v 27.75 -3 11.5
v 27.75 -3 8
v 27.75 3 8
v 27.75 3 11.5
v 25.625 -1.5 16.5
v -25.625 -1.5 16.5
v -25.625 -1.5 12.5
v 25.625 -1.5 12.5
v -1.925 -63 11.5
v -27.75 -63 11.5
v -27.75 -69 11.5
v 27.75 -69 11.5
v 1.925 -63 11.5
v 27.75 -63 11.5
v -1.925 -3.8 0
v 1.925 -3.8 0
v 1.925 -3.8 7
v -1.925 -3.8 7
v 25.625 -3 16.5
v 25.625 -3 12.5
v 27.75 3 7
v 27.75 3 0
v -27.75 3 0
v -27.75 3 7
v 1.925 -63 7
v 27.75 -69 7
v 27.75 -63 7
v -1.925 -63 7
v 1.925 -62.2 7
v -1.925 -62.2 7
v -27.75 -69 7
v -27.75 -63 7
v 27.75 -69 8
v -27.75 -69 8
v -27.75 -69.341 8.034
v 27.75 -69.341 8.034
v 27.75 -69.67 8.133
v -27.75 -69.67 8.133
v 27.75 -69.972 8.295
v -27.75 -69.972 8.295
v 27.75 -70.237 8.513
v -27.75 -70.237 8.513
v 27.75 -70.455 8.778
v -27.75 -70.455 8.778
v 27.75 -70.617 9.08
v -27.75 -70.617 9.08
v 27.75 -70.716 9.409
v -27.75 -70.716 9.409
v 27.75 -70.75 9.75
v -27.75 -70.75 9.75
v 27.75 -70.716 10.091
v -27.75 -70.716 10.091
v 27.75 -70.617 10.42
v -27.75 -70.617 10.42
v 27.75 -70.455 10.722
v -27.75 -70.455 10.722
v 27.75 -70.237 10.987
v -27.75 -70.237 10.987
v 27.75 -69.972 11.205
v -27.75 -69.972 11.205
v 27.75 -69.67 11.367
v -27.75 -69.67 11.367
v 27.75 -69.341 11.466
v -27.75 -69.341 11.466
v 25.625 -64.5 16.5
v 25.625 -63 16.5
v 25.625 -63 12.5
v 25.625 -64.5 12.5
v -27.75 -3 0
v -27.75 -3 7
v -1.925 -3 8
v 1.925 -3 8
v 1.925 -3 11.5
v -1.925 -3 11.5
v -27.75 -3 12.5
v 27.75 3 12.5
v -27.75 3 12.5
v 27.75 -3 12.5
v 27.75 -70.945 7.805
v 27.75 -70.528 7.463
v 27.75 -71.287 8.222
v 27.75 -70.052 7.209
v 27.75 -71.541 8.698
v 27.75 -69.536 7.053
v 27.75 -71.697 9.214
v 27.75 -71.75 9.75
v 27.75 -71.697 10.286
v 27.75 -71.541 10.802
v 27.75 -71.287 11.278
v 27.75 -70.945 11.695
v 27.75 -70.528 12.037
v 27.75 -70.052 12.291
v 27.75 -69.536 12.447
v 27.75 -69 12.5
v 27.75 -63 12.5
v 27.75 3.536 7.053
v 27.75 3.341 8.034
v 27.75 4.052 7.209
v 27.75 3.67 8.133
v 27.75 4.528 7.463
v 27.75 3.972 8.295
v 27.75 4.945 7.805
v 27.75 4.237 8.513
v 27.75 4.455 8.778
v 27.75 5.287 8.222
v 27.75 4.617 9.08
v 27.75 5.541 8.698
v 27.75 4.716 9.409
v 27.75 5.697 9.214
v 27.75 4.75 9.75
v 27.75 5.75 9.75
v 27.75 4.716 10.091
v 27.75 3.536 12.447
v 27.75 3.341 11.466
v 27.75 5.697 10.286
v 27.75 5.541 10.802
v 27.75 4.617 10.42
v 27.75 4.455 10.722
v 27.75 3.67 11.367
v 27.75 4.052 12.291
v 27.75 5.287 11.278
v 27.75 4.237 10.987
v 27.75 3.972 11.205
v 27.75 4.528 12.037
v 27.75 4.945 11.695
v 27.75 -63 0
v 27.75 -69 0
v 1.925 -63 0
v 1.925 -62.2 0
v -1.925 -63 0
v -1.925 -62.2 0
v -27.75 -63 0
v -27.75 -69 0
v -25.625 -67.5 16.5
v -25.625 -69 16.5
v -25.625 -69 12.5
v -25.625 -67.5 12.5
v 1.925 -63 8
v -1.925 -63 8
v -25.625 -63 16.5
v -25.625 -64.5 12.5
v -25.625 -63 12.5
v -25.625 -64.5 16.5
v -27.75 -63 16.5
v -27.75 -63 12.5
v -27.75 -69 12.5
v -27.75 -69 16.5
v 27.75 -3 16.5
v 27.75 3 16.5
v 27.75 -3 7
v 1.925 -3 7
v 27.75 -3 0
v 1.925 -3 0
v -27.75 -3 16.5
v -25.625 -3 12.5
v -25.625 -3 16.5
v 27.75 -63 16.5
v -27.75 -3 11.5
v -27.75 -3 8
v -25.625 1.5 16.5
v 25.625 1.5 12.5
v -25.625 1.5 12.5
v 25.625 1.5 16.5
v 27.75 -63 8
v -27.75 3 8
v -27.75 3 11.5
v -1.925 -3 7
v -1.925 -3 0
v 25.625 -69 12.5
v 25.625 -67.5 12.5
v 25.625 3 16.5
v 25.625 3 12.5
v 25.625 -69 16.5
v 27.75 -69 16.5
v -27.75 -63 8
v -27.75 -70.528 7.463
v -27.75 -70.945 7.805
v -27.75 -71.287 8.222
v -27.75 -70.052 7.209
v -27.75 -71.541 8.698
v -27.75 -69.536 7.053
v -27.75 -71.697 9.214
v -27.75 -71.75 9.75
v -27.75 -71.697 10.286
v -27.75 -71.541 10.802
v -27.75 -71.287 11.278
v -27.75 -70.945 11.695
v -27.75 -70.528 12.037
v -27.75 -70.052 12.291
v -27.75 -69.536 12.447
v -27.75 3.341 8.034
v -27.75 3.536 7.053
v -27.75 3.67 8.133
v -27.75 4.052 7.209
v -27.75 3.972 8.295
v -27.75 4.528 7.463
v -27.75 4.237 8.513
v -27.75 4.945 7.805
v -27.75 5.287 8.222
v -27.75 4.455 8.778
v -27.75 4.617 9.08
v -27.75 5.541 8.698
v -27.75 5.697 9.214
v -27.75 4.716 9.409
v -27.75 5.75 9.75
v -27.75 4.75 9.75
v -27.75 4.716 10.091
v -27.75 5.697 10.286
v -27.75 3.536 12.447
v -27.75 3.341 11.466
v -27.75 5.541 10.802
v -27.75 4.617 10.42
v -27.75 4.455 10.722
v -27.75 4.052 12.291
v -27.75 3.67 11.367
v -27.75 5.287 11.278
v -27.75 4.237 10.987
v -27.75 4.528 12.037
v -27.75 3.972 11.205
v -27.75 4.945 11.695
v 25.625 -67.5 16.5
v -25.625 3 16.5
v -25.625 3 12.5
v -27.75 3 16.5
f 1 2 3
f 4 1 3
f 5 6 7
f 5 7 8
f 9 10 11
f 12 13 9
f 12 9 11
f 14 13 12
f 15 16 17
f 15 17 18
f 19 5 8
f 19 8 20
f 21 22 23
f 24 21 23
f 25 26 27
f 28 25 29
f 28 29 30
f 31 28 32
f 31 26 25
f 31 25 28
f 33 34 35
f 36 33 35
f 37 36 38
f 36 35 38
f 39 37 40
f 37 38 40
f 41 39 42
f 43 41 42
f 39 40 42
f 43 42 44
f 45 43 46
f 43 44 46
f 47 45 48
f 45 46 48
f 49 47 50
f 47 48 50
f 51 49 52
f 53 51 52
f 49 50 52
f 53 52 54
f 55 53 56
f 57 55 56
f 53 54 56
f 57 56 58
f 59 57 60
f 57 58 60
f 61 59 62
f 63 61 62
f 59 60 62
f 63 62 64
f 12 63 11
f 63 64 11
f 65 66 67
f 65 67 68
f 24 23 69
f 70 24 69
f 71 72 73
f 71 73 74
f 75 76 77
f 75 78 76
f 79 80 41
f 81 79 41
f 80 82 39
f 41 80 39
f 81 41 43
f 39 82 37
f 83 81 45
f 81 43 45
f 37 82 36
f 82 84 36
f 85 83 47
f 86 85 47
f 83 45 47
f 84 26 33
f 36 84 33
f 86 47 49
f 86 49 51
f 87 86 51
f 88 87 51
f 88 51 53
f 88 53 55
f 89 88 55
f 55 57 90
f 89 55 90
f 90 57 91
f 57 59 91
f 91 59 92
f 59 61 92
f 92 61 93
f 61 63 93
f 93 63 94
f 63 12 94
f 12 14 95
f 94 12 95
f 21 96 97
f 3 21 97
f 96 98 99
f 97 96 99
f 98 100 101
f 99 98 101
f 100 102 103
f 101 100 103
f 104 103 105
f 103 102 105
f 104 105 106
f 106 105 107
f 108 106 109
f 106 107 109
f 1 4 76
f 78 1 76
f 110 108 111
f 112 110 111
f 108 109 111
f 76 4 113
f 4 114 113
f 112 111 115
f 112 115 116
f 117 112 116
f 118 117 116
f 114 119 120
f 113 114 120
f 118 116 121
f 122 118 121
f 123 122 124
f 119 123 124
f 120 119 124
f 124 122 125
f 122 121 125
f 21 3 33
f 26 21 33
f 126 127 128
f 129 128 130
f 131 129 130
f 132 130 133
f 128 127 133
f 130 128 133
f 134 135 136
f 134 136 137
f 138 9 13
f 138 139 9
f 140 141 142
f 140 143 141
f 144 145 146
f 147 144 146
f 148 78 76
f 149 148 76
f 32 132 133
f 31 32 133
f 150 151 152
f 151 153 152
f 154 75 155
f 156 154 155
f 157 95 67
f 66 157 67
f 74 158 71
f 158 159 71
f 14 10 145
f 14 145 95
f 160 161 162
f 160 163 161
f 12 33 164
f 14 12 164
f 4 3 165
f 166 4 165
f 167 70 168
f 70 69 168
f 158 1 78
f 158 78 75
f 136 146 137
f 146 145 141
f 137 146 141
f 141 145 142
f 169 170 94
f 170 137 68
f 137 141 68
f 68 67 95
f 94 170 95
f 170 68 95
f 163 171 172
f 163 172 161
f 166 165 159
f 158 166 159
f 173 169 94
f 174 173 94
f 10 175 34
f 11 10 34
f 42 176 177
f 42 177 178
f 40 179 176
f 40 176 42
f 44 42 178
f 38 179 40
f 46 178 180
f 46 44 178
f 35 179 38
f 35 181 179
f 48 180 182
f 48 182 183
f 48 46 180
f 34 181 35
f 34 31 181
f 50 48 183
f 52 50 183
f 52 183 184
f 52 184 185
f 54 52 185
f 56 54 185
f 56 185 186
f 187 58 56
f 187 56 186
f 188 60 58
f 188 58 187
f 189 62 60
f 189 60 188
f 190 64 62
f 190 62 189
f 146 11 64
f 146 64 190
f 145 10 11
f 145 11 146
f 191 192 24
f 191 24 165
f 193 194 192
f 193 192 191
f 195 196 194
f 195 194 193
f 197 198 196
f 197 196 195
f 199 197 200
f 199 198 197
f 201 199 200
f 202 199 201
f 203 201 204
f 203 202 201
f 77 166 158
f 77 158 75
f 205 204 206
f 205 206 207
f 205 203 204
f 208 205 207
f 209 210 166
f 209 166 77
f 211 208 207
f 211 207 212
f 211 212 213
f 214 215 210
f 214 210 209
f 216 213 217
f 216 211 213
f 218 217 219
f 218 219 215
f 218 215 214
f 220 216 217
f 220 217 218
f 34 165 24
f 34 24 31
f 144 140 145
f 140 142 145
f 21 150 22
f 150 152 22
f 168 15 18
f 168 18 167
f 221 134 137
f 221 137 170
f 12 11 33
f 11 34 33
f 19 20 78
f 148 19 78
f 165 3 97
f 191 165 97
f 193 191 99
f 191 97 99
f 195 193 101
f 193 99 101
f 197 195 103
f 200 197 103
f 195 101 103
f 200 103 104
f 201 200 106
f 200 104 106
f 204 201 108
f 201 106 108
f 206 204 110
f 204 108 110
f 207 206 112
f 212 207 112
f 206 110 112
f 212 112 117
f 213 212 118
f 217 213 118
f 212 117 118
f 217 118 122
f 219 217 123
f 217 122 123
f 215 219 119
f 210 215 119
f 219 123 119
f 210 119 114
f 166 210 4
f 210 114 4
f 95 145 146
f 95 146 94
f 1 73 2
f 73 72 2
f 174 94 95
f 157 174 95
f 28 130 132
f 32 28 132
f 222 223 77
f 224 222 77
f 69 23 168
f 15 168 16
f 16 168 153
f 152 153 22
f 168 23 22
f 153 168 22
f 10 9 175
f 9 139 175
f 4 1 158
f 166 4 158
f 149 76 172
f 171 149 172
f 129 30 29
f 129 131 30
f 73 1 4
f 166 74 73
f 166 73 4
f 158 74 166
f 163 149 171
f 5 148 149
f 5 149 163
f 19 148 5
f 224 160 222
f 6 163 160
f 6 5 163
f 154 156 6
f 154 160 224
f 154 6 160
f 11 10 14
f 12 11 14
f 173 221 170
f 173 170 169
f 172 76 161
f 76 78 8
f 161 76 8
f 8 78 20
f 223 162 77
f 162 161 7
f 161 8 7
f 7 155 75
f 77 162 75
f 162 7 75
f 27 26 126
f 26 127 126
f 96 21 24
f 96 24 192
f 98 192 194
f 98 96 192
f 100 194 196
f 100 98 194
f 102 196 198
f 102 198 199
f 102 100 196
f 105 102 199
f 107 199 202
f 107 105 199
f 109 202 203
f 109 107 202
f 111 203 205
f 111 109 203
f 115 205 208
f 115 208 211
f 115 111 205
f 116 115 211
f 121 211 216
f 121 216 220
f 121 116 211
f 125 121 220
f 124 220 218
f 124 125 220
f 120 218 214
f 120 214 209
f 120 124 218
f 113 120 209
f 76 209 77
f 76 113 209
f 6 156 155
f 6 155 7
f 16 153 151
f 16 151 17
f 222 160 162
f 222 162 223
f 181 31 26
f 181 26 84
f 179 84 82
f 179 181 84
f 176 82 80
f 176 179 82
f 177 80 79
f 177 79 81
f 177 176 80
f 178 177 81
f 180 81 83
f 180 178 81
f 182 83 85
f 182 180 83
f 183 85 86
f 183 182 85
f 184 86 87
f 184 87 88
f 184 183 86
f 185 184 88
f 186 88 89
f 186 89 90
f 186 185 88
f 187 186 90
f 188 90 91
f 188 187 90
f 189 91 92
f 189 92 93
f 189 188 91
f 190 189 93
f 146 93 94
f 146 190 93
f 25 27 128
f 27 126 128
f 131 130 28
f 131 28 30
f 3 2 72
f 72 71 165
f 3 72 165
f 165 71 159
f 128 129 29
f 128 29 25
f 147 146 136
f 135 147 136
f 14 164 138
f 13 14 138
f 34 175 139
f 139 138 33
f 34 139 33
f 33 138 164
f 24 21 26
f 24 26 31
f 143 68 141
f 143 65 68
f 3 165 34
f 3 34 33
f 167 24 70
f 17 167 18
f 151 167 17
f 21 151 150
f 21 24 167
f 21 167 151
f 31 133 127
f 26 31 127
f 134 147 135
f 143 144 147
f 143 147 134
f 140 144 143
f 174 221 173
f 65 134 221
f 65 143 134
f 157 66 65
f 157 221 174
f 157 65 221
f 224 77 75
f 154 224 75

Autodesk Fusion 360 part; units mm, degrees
sketch "Sketch1" plane through (0, 0, 0) normal (0, 0, 1) x (1, 0, 0) in component "GPIO Header cable v2"
  line L0 (27.75, 3) -> (-27.75, 3)
  line L1 (-27.75, 3) -> (-27.75, -3)
  line L2 (-27.75, -3) -> (27.75, -3)
  line L3 (27.75, -3) -> (27.75, 3)
  line L4 (27.75, 3) -> (-27.75, -3) construction
  line L5 (-27.75, 3) -> (27.75, -3) construction
  line L6 (-1.925, -3) -> (1.925, -3)
  line L7 (1.925, -3) -> (1.925, -3.8)
  line L8 (1.925, -3.8) -> (-1.925, -3.8)
  line L9 (-1.925, -3.8) -> (-1.925, -3)
  dimension "d1" = 55.5
  dimension "d2" = 6
  dimension "d3" = 3.85
  dimension "d4" = 0.8
extrude "Extrude1" add sketch "Sketch1" along normal blind 7 makes body 1 in component "GPIO Header cable v2"
sketch "Sketch2" plane through (0, 0, 7) normal (0, 0, 1) x (-1, 0, 0) in component "GPIO Header cable v2"
  line L0 (-1.925, 3) -> (-27.75, 3)
  line L1 (-27.75, 3) -> (-27.75, -3)
  line L2 (-27.75, -3) -> (27.75, -3)
  line L3 (27.75, -3) -> (27.75, 3)
  line L4 (27.75, 3) -> (1.925, 3)
  line L5 (1.925, 3) -> (1.925, 3.8)
  line L6 (1.925, 3.8) -> (-1.925, 3.8)
  line L7 (-1.925, 3.8) -> (-1.925, 3)
  line L8 (27.75, -3) -> (-27.75, -3)
  line L9 (-27.75, -3) -> (-27.75, 3)
  line L10 (-27.75, 3) -> (27.75, 3)
  line L11 (27.75, 3) -> (27.75, -3)
extrude "Extrude2" add sketch "Sketch2" along normal blind 1 separate body contours L0 L1 L2 L3 L4 L8 L9 L10 L11 makes body 2 in component "GPIO Header cable v2"
extrude "Extrude3" add 1 faces at (0.6417, 1, 8) along direction (0, 0, 1) blind 3.5 separate body on bodies 2 makes body 3 in component "GPIO Header cable v2"
extrude "Extrude4" add 1 faces at (0.6417, 1, 11.5) along direction (0, 0, 1) blind 1 separate body on bodies 3 makes body 4 in component "GPIO Header cable v2"
extrude "Extrude5" add 1 faces at (0.6417, 1, 12.5) along direction (0, 0, 1) blind 4 separate body on bodies 4 makes body 5 in component "GPIO Header cable v2"
sketch "Sketch4" plane through (0, 0, 16.5) normal (0, 0, 1) x (-1, 0, 0) in component "GPIO Header cable v2"
  line L0 (27.75, 3) -> (-27.75, 3)
  line L1 (-27.75, 3) -> (-27.75, -3)
  line L2 (-27.75, -3) -> (27.75, -3)
  line L3 (27.75, -3) -> (27.75, 3)
  line L4 (25.625, -3) -> (-25.625, -3)
  line L5 (-25.625, -3) -> (-25.625, -1.5)
  line L6 (-25.625, -1.5) -> (25.625, -1.5)
  line L7 (25.625, -1.5) -> (25.625, -3)
  line L8 (25.625, 1.5) -> (-25.625, 1.5)
  line L9 (-25.625, 1.5) -> (-25.625, 3)
  line L10 (-25.625, 3) -> (25.625, 3)
  line L11 (25.625, 3) -> (25.625, 1.5)
  dimension "d15" = 51.25
  dimension "d16" = 1.5
  dimension "d17" = 1.5
  dimension "d18" = 51.25
extrude "Extrude6" cut sketch "Sketch4" against normal blind 4 contours L0 L8 L9 L10 L11 | L2 L4 L5 L6 L7 bodies 5 in component "GPIO Header cable v2"
extrude "Extrude7" add 3 faces at (0.6417, -3, 7.3333) (-19.1417, -3, 7.3333) (10.5333, -3, 7.3333) along direction (0, -1, 0) blind 15 on bodies 2 bodies 2 in component "GPIO Header cable v2"
sketch "Sketch5" plane through (27.75, 0, 0) normal (1, 0, 0) x (0, 1, 0) in component "GPIO Header cable v2"
  line L0 (-3, 8) -> (3, 8)
  line L1 (3, 8) -> (3, 11.5)
  line L2 (3, 11.5) -> (-3, 11.5)
  line L3 (-3, 11.5) -> (-3, 8)
  arc A0 (3, 8) -> (3, 11.5) centre (3, 9.75) ccw
  arc A1 (3, 7) -> (3, 12.5) centre (3, 9.75) ccw
  line L4 (3, 12.5) -> (3, 11.5)
  line L5 (3, 8) -> (3, 7)
  dimension "d23" = 1
extrude "Extrude8" add sketch "Sketch5" against normal blind 55.5 contours A0 A1 L4 L5 bodies 2 4 in component "GPIO Header cable v2"
extrude "Extrude9" add 1 faces at (9.25, -18, 7.3333) along direction (0, -1, 0) blind 15 on bodies 2 bodies 2 in component "GPIO Header cable v2"
sketch "Sketch1 (2)" plane through (0, 0, 0) normal (0, 0, 1) x (1, 0, 0) in component "GPIO Header cable v2 (1)"
  line L0 (27.75, 3) -> (-27.75, 3)
  line L1 (-27.75, 3) -> (-27.75, -3)
  line L2 (-27.75, -3) -> (27.75, -3)
  line L3 (27.75, -3) -> (27.75, 3)
  line L4 (27.75, 3) -> (-27.75, -3) construction
  line L5 (-27.75, 3) -> (27.75, -3) construction
  line L6 (-1.925, -3) -> (1.925, -3)
  line L7 (1.925, -3) -> (1.925, -3.8)
  line L8 (1.925, -3.8) -> (-1.925, -3.8)
  line L9 (-1.925, -3.8) -> (-1.925, -3)
  dimension "d1_1" = 55.5
  dimension "d2_1" = 6
  dimension "d3_1" = 3.85
  dimension "d4_1" = 0.8
extrude "Extrude1'" add sketch "Sketch1 (2)" along normal blind 7 separate body makes body 6 in component "GPIO Header cable v2 (1)"
sketch "Sketch2 (2)" plane through (0, 0, 7) normal (0, 0, 1) x (-1, 0, 0) in component "GPIO Header cable v2 (1)"
  line L0 (-1.925, 3) -> (-27.75, 3)
  line L1 (-27.75, 3) -> (-27.75, -3)
  line L2 (-27.75, -3) -> (27.75, -3)
  line L3 (27.75, -3) -> (27.75, 3)
  line L4 (27.75, 3) -> (1.925, 3)
  line L5 (1.925, 3) -> (1.925, 3.8)
  line L6 (1.925, 3.8) -> (-1.925, 3.8)
  line L7 (-1.925, 3.8) -> (-1.925, 3)
  line L8 (27.75, -3) -> (-27.75, -3)
  line L9 (-27.75, -3) -> (-27.75, 3)
  line L10 (-27.75, 3) -> (27.75, 3)
  line L11 (27.75, 3) -> (27.75, -3)
extrude "Extrude2'" add sketch "Sketch2 (2)" along normal blind 1 separate body contours L0 L1 L2 L3 L4 L8 L9 L10 L11 makes body 7 in component "GPIO Header cable v2 (1)"
extrude "Extrude3'" add 1 faces at (0.6417, 1, 8) along direction (0, 0, 1) blind 3.5 separate body on bodies 7 makes body 8 in component "GPIO Header cable v2 (1)"
extrude "Extrude4'" add 1 faces at (0.6417, 1, 11.5) along direction (0, 0, 1) blind 1 separate body on bodies 8 makes body 9 in component "GPIO Header cable v2 (1)"
extrude "Extrude5'" add 1 faces at (0.6417, 1, 12.5) along direction (0, 0, 1) blind 4 separate body on bodies 9 makes body 10 in component "GPIO Header cable v2 (1)"
sketch "Sketch4 (2)" plane through (0, 0, 16.5) normal (0, 0, 1) x (-1, 0, 0) in component "GPIO Header cable v2 (1)"
  line L0 (27.75, 3) -> (-27.75, 3)
  line L1 (-27.75, 3) -> (-27.75, -3)
  line L2 (-27.75, -3) -> (27.75, -3)
  line L3 (27.75, -3) -> (27.75, 3)
  line L4 (25.625, -3) -> (-25.625, -3)
  line L5 (-25.625, -3) -> (-25.625, -1.5)
  line L6 (-25.625, -1.5) -> (25.625, -1.5)
  line L7 (25.625, -1.5) -> (25.625, -3)
  line L8 (25.625, 1.5) -> (-25.625, 1.5)
  line L9 (-25.625, 1.5) -> (-25.625, 3)
  line L10 (-25.625, 3) -> (25.625, 3)
  line L11 (25.625, 3) -> (25.625, 1.5)
  dimension "d15_1" = 51.25
  dimension "d16_1" = 1.5
  dimension "d17_1" = 1.5
  dimension "d18_1" = 51.25
extrude "Extrude6'" cut sketch "Sketch4 (2)" against normal blind 4 contours L0 L8 L9 L10 L11 | L2 L4 L5 L6 L7 bodies 10 in component "GPIO Header cable v2 (1)"
extrude "Extrude7'" add 3 faces at (0.6417, -3, 7.3333) (-19.1417, -3, 7.3333) (10.5333, -3, 7.3333) along direction (0, -1, 0) blind 15 on bodies 7 bodies 7 in component "GPIO Header cable v2 (1)"
sketch "Sketch5 (2)" plane through (27.75, 0, 0) normal (1, 0, 0) x (0, 1, 0) in component "GPIO Header cable v2 (1)"
  line L0 (-3, 8) -> (3, 8)
  line L1 (3, 8) -> (3, 11.5)
  line L2 (3, 11.5) -> (-3, 11.5)
  line L3 (-3, 11.5) -> (-3, 8)
  arc A0 (3, 8) -> (3, 11.5) centre (3, 9.75) ccw
  arc A1 (3, 7) -> (3, 12.5) centre (3, 9.75) ccw
  line L4 (3, 12.5) -> (3, 11.5)
  line L5 (3, 8) -> (3, 7)
  dimension "d23_1" = 1
extrude "Extrude8'" add sketch "Sketch5 (2)" against normal blind 55.5 contours A0 A1 L4 L5 bodies 7 9 in component "GPIO Header cable v2 (1)"
extrude "Extrude9'" add 1 faces at (9.25, -18, 7.3333) along direction (0, -1, 0) blind 15 on bodies 7 bodies 7 in component "GPIO Header cable v2 (1)"
combine "Combine1" operation add target body 2 tool bodies 7 body 7 seen with x (-1, 0, 0) y (0, -1, 0) z (0, 0, 1) at (0, -66, 0) in component "GPIO Header cable v2"
component "GPIO Header cable v2" placed x (1, 0, 0) y (0, 1, 0) z (0, 0, 1) at (0, 0, 0)
component "GPIO Header cable v2 (1)" placed x (-1, 0, 0) y (0, -1, 0) z (0, 0, 1) at (0, -66, 0)
